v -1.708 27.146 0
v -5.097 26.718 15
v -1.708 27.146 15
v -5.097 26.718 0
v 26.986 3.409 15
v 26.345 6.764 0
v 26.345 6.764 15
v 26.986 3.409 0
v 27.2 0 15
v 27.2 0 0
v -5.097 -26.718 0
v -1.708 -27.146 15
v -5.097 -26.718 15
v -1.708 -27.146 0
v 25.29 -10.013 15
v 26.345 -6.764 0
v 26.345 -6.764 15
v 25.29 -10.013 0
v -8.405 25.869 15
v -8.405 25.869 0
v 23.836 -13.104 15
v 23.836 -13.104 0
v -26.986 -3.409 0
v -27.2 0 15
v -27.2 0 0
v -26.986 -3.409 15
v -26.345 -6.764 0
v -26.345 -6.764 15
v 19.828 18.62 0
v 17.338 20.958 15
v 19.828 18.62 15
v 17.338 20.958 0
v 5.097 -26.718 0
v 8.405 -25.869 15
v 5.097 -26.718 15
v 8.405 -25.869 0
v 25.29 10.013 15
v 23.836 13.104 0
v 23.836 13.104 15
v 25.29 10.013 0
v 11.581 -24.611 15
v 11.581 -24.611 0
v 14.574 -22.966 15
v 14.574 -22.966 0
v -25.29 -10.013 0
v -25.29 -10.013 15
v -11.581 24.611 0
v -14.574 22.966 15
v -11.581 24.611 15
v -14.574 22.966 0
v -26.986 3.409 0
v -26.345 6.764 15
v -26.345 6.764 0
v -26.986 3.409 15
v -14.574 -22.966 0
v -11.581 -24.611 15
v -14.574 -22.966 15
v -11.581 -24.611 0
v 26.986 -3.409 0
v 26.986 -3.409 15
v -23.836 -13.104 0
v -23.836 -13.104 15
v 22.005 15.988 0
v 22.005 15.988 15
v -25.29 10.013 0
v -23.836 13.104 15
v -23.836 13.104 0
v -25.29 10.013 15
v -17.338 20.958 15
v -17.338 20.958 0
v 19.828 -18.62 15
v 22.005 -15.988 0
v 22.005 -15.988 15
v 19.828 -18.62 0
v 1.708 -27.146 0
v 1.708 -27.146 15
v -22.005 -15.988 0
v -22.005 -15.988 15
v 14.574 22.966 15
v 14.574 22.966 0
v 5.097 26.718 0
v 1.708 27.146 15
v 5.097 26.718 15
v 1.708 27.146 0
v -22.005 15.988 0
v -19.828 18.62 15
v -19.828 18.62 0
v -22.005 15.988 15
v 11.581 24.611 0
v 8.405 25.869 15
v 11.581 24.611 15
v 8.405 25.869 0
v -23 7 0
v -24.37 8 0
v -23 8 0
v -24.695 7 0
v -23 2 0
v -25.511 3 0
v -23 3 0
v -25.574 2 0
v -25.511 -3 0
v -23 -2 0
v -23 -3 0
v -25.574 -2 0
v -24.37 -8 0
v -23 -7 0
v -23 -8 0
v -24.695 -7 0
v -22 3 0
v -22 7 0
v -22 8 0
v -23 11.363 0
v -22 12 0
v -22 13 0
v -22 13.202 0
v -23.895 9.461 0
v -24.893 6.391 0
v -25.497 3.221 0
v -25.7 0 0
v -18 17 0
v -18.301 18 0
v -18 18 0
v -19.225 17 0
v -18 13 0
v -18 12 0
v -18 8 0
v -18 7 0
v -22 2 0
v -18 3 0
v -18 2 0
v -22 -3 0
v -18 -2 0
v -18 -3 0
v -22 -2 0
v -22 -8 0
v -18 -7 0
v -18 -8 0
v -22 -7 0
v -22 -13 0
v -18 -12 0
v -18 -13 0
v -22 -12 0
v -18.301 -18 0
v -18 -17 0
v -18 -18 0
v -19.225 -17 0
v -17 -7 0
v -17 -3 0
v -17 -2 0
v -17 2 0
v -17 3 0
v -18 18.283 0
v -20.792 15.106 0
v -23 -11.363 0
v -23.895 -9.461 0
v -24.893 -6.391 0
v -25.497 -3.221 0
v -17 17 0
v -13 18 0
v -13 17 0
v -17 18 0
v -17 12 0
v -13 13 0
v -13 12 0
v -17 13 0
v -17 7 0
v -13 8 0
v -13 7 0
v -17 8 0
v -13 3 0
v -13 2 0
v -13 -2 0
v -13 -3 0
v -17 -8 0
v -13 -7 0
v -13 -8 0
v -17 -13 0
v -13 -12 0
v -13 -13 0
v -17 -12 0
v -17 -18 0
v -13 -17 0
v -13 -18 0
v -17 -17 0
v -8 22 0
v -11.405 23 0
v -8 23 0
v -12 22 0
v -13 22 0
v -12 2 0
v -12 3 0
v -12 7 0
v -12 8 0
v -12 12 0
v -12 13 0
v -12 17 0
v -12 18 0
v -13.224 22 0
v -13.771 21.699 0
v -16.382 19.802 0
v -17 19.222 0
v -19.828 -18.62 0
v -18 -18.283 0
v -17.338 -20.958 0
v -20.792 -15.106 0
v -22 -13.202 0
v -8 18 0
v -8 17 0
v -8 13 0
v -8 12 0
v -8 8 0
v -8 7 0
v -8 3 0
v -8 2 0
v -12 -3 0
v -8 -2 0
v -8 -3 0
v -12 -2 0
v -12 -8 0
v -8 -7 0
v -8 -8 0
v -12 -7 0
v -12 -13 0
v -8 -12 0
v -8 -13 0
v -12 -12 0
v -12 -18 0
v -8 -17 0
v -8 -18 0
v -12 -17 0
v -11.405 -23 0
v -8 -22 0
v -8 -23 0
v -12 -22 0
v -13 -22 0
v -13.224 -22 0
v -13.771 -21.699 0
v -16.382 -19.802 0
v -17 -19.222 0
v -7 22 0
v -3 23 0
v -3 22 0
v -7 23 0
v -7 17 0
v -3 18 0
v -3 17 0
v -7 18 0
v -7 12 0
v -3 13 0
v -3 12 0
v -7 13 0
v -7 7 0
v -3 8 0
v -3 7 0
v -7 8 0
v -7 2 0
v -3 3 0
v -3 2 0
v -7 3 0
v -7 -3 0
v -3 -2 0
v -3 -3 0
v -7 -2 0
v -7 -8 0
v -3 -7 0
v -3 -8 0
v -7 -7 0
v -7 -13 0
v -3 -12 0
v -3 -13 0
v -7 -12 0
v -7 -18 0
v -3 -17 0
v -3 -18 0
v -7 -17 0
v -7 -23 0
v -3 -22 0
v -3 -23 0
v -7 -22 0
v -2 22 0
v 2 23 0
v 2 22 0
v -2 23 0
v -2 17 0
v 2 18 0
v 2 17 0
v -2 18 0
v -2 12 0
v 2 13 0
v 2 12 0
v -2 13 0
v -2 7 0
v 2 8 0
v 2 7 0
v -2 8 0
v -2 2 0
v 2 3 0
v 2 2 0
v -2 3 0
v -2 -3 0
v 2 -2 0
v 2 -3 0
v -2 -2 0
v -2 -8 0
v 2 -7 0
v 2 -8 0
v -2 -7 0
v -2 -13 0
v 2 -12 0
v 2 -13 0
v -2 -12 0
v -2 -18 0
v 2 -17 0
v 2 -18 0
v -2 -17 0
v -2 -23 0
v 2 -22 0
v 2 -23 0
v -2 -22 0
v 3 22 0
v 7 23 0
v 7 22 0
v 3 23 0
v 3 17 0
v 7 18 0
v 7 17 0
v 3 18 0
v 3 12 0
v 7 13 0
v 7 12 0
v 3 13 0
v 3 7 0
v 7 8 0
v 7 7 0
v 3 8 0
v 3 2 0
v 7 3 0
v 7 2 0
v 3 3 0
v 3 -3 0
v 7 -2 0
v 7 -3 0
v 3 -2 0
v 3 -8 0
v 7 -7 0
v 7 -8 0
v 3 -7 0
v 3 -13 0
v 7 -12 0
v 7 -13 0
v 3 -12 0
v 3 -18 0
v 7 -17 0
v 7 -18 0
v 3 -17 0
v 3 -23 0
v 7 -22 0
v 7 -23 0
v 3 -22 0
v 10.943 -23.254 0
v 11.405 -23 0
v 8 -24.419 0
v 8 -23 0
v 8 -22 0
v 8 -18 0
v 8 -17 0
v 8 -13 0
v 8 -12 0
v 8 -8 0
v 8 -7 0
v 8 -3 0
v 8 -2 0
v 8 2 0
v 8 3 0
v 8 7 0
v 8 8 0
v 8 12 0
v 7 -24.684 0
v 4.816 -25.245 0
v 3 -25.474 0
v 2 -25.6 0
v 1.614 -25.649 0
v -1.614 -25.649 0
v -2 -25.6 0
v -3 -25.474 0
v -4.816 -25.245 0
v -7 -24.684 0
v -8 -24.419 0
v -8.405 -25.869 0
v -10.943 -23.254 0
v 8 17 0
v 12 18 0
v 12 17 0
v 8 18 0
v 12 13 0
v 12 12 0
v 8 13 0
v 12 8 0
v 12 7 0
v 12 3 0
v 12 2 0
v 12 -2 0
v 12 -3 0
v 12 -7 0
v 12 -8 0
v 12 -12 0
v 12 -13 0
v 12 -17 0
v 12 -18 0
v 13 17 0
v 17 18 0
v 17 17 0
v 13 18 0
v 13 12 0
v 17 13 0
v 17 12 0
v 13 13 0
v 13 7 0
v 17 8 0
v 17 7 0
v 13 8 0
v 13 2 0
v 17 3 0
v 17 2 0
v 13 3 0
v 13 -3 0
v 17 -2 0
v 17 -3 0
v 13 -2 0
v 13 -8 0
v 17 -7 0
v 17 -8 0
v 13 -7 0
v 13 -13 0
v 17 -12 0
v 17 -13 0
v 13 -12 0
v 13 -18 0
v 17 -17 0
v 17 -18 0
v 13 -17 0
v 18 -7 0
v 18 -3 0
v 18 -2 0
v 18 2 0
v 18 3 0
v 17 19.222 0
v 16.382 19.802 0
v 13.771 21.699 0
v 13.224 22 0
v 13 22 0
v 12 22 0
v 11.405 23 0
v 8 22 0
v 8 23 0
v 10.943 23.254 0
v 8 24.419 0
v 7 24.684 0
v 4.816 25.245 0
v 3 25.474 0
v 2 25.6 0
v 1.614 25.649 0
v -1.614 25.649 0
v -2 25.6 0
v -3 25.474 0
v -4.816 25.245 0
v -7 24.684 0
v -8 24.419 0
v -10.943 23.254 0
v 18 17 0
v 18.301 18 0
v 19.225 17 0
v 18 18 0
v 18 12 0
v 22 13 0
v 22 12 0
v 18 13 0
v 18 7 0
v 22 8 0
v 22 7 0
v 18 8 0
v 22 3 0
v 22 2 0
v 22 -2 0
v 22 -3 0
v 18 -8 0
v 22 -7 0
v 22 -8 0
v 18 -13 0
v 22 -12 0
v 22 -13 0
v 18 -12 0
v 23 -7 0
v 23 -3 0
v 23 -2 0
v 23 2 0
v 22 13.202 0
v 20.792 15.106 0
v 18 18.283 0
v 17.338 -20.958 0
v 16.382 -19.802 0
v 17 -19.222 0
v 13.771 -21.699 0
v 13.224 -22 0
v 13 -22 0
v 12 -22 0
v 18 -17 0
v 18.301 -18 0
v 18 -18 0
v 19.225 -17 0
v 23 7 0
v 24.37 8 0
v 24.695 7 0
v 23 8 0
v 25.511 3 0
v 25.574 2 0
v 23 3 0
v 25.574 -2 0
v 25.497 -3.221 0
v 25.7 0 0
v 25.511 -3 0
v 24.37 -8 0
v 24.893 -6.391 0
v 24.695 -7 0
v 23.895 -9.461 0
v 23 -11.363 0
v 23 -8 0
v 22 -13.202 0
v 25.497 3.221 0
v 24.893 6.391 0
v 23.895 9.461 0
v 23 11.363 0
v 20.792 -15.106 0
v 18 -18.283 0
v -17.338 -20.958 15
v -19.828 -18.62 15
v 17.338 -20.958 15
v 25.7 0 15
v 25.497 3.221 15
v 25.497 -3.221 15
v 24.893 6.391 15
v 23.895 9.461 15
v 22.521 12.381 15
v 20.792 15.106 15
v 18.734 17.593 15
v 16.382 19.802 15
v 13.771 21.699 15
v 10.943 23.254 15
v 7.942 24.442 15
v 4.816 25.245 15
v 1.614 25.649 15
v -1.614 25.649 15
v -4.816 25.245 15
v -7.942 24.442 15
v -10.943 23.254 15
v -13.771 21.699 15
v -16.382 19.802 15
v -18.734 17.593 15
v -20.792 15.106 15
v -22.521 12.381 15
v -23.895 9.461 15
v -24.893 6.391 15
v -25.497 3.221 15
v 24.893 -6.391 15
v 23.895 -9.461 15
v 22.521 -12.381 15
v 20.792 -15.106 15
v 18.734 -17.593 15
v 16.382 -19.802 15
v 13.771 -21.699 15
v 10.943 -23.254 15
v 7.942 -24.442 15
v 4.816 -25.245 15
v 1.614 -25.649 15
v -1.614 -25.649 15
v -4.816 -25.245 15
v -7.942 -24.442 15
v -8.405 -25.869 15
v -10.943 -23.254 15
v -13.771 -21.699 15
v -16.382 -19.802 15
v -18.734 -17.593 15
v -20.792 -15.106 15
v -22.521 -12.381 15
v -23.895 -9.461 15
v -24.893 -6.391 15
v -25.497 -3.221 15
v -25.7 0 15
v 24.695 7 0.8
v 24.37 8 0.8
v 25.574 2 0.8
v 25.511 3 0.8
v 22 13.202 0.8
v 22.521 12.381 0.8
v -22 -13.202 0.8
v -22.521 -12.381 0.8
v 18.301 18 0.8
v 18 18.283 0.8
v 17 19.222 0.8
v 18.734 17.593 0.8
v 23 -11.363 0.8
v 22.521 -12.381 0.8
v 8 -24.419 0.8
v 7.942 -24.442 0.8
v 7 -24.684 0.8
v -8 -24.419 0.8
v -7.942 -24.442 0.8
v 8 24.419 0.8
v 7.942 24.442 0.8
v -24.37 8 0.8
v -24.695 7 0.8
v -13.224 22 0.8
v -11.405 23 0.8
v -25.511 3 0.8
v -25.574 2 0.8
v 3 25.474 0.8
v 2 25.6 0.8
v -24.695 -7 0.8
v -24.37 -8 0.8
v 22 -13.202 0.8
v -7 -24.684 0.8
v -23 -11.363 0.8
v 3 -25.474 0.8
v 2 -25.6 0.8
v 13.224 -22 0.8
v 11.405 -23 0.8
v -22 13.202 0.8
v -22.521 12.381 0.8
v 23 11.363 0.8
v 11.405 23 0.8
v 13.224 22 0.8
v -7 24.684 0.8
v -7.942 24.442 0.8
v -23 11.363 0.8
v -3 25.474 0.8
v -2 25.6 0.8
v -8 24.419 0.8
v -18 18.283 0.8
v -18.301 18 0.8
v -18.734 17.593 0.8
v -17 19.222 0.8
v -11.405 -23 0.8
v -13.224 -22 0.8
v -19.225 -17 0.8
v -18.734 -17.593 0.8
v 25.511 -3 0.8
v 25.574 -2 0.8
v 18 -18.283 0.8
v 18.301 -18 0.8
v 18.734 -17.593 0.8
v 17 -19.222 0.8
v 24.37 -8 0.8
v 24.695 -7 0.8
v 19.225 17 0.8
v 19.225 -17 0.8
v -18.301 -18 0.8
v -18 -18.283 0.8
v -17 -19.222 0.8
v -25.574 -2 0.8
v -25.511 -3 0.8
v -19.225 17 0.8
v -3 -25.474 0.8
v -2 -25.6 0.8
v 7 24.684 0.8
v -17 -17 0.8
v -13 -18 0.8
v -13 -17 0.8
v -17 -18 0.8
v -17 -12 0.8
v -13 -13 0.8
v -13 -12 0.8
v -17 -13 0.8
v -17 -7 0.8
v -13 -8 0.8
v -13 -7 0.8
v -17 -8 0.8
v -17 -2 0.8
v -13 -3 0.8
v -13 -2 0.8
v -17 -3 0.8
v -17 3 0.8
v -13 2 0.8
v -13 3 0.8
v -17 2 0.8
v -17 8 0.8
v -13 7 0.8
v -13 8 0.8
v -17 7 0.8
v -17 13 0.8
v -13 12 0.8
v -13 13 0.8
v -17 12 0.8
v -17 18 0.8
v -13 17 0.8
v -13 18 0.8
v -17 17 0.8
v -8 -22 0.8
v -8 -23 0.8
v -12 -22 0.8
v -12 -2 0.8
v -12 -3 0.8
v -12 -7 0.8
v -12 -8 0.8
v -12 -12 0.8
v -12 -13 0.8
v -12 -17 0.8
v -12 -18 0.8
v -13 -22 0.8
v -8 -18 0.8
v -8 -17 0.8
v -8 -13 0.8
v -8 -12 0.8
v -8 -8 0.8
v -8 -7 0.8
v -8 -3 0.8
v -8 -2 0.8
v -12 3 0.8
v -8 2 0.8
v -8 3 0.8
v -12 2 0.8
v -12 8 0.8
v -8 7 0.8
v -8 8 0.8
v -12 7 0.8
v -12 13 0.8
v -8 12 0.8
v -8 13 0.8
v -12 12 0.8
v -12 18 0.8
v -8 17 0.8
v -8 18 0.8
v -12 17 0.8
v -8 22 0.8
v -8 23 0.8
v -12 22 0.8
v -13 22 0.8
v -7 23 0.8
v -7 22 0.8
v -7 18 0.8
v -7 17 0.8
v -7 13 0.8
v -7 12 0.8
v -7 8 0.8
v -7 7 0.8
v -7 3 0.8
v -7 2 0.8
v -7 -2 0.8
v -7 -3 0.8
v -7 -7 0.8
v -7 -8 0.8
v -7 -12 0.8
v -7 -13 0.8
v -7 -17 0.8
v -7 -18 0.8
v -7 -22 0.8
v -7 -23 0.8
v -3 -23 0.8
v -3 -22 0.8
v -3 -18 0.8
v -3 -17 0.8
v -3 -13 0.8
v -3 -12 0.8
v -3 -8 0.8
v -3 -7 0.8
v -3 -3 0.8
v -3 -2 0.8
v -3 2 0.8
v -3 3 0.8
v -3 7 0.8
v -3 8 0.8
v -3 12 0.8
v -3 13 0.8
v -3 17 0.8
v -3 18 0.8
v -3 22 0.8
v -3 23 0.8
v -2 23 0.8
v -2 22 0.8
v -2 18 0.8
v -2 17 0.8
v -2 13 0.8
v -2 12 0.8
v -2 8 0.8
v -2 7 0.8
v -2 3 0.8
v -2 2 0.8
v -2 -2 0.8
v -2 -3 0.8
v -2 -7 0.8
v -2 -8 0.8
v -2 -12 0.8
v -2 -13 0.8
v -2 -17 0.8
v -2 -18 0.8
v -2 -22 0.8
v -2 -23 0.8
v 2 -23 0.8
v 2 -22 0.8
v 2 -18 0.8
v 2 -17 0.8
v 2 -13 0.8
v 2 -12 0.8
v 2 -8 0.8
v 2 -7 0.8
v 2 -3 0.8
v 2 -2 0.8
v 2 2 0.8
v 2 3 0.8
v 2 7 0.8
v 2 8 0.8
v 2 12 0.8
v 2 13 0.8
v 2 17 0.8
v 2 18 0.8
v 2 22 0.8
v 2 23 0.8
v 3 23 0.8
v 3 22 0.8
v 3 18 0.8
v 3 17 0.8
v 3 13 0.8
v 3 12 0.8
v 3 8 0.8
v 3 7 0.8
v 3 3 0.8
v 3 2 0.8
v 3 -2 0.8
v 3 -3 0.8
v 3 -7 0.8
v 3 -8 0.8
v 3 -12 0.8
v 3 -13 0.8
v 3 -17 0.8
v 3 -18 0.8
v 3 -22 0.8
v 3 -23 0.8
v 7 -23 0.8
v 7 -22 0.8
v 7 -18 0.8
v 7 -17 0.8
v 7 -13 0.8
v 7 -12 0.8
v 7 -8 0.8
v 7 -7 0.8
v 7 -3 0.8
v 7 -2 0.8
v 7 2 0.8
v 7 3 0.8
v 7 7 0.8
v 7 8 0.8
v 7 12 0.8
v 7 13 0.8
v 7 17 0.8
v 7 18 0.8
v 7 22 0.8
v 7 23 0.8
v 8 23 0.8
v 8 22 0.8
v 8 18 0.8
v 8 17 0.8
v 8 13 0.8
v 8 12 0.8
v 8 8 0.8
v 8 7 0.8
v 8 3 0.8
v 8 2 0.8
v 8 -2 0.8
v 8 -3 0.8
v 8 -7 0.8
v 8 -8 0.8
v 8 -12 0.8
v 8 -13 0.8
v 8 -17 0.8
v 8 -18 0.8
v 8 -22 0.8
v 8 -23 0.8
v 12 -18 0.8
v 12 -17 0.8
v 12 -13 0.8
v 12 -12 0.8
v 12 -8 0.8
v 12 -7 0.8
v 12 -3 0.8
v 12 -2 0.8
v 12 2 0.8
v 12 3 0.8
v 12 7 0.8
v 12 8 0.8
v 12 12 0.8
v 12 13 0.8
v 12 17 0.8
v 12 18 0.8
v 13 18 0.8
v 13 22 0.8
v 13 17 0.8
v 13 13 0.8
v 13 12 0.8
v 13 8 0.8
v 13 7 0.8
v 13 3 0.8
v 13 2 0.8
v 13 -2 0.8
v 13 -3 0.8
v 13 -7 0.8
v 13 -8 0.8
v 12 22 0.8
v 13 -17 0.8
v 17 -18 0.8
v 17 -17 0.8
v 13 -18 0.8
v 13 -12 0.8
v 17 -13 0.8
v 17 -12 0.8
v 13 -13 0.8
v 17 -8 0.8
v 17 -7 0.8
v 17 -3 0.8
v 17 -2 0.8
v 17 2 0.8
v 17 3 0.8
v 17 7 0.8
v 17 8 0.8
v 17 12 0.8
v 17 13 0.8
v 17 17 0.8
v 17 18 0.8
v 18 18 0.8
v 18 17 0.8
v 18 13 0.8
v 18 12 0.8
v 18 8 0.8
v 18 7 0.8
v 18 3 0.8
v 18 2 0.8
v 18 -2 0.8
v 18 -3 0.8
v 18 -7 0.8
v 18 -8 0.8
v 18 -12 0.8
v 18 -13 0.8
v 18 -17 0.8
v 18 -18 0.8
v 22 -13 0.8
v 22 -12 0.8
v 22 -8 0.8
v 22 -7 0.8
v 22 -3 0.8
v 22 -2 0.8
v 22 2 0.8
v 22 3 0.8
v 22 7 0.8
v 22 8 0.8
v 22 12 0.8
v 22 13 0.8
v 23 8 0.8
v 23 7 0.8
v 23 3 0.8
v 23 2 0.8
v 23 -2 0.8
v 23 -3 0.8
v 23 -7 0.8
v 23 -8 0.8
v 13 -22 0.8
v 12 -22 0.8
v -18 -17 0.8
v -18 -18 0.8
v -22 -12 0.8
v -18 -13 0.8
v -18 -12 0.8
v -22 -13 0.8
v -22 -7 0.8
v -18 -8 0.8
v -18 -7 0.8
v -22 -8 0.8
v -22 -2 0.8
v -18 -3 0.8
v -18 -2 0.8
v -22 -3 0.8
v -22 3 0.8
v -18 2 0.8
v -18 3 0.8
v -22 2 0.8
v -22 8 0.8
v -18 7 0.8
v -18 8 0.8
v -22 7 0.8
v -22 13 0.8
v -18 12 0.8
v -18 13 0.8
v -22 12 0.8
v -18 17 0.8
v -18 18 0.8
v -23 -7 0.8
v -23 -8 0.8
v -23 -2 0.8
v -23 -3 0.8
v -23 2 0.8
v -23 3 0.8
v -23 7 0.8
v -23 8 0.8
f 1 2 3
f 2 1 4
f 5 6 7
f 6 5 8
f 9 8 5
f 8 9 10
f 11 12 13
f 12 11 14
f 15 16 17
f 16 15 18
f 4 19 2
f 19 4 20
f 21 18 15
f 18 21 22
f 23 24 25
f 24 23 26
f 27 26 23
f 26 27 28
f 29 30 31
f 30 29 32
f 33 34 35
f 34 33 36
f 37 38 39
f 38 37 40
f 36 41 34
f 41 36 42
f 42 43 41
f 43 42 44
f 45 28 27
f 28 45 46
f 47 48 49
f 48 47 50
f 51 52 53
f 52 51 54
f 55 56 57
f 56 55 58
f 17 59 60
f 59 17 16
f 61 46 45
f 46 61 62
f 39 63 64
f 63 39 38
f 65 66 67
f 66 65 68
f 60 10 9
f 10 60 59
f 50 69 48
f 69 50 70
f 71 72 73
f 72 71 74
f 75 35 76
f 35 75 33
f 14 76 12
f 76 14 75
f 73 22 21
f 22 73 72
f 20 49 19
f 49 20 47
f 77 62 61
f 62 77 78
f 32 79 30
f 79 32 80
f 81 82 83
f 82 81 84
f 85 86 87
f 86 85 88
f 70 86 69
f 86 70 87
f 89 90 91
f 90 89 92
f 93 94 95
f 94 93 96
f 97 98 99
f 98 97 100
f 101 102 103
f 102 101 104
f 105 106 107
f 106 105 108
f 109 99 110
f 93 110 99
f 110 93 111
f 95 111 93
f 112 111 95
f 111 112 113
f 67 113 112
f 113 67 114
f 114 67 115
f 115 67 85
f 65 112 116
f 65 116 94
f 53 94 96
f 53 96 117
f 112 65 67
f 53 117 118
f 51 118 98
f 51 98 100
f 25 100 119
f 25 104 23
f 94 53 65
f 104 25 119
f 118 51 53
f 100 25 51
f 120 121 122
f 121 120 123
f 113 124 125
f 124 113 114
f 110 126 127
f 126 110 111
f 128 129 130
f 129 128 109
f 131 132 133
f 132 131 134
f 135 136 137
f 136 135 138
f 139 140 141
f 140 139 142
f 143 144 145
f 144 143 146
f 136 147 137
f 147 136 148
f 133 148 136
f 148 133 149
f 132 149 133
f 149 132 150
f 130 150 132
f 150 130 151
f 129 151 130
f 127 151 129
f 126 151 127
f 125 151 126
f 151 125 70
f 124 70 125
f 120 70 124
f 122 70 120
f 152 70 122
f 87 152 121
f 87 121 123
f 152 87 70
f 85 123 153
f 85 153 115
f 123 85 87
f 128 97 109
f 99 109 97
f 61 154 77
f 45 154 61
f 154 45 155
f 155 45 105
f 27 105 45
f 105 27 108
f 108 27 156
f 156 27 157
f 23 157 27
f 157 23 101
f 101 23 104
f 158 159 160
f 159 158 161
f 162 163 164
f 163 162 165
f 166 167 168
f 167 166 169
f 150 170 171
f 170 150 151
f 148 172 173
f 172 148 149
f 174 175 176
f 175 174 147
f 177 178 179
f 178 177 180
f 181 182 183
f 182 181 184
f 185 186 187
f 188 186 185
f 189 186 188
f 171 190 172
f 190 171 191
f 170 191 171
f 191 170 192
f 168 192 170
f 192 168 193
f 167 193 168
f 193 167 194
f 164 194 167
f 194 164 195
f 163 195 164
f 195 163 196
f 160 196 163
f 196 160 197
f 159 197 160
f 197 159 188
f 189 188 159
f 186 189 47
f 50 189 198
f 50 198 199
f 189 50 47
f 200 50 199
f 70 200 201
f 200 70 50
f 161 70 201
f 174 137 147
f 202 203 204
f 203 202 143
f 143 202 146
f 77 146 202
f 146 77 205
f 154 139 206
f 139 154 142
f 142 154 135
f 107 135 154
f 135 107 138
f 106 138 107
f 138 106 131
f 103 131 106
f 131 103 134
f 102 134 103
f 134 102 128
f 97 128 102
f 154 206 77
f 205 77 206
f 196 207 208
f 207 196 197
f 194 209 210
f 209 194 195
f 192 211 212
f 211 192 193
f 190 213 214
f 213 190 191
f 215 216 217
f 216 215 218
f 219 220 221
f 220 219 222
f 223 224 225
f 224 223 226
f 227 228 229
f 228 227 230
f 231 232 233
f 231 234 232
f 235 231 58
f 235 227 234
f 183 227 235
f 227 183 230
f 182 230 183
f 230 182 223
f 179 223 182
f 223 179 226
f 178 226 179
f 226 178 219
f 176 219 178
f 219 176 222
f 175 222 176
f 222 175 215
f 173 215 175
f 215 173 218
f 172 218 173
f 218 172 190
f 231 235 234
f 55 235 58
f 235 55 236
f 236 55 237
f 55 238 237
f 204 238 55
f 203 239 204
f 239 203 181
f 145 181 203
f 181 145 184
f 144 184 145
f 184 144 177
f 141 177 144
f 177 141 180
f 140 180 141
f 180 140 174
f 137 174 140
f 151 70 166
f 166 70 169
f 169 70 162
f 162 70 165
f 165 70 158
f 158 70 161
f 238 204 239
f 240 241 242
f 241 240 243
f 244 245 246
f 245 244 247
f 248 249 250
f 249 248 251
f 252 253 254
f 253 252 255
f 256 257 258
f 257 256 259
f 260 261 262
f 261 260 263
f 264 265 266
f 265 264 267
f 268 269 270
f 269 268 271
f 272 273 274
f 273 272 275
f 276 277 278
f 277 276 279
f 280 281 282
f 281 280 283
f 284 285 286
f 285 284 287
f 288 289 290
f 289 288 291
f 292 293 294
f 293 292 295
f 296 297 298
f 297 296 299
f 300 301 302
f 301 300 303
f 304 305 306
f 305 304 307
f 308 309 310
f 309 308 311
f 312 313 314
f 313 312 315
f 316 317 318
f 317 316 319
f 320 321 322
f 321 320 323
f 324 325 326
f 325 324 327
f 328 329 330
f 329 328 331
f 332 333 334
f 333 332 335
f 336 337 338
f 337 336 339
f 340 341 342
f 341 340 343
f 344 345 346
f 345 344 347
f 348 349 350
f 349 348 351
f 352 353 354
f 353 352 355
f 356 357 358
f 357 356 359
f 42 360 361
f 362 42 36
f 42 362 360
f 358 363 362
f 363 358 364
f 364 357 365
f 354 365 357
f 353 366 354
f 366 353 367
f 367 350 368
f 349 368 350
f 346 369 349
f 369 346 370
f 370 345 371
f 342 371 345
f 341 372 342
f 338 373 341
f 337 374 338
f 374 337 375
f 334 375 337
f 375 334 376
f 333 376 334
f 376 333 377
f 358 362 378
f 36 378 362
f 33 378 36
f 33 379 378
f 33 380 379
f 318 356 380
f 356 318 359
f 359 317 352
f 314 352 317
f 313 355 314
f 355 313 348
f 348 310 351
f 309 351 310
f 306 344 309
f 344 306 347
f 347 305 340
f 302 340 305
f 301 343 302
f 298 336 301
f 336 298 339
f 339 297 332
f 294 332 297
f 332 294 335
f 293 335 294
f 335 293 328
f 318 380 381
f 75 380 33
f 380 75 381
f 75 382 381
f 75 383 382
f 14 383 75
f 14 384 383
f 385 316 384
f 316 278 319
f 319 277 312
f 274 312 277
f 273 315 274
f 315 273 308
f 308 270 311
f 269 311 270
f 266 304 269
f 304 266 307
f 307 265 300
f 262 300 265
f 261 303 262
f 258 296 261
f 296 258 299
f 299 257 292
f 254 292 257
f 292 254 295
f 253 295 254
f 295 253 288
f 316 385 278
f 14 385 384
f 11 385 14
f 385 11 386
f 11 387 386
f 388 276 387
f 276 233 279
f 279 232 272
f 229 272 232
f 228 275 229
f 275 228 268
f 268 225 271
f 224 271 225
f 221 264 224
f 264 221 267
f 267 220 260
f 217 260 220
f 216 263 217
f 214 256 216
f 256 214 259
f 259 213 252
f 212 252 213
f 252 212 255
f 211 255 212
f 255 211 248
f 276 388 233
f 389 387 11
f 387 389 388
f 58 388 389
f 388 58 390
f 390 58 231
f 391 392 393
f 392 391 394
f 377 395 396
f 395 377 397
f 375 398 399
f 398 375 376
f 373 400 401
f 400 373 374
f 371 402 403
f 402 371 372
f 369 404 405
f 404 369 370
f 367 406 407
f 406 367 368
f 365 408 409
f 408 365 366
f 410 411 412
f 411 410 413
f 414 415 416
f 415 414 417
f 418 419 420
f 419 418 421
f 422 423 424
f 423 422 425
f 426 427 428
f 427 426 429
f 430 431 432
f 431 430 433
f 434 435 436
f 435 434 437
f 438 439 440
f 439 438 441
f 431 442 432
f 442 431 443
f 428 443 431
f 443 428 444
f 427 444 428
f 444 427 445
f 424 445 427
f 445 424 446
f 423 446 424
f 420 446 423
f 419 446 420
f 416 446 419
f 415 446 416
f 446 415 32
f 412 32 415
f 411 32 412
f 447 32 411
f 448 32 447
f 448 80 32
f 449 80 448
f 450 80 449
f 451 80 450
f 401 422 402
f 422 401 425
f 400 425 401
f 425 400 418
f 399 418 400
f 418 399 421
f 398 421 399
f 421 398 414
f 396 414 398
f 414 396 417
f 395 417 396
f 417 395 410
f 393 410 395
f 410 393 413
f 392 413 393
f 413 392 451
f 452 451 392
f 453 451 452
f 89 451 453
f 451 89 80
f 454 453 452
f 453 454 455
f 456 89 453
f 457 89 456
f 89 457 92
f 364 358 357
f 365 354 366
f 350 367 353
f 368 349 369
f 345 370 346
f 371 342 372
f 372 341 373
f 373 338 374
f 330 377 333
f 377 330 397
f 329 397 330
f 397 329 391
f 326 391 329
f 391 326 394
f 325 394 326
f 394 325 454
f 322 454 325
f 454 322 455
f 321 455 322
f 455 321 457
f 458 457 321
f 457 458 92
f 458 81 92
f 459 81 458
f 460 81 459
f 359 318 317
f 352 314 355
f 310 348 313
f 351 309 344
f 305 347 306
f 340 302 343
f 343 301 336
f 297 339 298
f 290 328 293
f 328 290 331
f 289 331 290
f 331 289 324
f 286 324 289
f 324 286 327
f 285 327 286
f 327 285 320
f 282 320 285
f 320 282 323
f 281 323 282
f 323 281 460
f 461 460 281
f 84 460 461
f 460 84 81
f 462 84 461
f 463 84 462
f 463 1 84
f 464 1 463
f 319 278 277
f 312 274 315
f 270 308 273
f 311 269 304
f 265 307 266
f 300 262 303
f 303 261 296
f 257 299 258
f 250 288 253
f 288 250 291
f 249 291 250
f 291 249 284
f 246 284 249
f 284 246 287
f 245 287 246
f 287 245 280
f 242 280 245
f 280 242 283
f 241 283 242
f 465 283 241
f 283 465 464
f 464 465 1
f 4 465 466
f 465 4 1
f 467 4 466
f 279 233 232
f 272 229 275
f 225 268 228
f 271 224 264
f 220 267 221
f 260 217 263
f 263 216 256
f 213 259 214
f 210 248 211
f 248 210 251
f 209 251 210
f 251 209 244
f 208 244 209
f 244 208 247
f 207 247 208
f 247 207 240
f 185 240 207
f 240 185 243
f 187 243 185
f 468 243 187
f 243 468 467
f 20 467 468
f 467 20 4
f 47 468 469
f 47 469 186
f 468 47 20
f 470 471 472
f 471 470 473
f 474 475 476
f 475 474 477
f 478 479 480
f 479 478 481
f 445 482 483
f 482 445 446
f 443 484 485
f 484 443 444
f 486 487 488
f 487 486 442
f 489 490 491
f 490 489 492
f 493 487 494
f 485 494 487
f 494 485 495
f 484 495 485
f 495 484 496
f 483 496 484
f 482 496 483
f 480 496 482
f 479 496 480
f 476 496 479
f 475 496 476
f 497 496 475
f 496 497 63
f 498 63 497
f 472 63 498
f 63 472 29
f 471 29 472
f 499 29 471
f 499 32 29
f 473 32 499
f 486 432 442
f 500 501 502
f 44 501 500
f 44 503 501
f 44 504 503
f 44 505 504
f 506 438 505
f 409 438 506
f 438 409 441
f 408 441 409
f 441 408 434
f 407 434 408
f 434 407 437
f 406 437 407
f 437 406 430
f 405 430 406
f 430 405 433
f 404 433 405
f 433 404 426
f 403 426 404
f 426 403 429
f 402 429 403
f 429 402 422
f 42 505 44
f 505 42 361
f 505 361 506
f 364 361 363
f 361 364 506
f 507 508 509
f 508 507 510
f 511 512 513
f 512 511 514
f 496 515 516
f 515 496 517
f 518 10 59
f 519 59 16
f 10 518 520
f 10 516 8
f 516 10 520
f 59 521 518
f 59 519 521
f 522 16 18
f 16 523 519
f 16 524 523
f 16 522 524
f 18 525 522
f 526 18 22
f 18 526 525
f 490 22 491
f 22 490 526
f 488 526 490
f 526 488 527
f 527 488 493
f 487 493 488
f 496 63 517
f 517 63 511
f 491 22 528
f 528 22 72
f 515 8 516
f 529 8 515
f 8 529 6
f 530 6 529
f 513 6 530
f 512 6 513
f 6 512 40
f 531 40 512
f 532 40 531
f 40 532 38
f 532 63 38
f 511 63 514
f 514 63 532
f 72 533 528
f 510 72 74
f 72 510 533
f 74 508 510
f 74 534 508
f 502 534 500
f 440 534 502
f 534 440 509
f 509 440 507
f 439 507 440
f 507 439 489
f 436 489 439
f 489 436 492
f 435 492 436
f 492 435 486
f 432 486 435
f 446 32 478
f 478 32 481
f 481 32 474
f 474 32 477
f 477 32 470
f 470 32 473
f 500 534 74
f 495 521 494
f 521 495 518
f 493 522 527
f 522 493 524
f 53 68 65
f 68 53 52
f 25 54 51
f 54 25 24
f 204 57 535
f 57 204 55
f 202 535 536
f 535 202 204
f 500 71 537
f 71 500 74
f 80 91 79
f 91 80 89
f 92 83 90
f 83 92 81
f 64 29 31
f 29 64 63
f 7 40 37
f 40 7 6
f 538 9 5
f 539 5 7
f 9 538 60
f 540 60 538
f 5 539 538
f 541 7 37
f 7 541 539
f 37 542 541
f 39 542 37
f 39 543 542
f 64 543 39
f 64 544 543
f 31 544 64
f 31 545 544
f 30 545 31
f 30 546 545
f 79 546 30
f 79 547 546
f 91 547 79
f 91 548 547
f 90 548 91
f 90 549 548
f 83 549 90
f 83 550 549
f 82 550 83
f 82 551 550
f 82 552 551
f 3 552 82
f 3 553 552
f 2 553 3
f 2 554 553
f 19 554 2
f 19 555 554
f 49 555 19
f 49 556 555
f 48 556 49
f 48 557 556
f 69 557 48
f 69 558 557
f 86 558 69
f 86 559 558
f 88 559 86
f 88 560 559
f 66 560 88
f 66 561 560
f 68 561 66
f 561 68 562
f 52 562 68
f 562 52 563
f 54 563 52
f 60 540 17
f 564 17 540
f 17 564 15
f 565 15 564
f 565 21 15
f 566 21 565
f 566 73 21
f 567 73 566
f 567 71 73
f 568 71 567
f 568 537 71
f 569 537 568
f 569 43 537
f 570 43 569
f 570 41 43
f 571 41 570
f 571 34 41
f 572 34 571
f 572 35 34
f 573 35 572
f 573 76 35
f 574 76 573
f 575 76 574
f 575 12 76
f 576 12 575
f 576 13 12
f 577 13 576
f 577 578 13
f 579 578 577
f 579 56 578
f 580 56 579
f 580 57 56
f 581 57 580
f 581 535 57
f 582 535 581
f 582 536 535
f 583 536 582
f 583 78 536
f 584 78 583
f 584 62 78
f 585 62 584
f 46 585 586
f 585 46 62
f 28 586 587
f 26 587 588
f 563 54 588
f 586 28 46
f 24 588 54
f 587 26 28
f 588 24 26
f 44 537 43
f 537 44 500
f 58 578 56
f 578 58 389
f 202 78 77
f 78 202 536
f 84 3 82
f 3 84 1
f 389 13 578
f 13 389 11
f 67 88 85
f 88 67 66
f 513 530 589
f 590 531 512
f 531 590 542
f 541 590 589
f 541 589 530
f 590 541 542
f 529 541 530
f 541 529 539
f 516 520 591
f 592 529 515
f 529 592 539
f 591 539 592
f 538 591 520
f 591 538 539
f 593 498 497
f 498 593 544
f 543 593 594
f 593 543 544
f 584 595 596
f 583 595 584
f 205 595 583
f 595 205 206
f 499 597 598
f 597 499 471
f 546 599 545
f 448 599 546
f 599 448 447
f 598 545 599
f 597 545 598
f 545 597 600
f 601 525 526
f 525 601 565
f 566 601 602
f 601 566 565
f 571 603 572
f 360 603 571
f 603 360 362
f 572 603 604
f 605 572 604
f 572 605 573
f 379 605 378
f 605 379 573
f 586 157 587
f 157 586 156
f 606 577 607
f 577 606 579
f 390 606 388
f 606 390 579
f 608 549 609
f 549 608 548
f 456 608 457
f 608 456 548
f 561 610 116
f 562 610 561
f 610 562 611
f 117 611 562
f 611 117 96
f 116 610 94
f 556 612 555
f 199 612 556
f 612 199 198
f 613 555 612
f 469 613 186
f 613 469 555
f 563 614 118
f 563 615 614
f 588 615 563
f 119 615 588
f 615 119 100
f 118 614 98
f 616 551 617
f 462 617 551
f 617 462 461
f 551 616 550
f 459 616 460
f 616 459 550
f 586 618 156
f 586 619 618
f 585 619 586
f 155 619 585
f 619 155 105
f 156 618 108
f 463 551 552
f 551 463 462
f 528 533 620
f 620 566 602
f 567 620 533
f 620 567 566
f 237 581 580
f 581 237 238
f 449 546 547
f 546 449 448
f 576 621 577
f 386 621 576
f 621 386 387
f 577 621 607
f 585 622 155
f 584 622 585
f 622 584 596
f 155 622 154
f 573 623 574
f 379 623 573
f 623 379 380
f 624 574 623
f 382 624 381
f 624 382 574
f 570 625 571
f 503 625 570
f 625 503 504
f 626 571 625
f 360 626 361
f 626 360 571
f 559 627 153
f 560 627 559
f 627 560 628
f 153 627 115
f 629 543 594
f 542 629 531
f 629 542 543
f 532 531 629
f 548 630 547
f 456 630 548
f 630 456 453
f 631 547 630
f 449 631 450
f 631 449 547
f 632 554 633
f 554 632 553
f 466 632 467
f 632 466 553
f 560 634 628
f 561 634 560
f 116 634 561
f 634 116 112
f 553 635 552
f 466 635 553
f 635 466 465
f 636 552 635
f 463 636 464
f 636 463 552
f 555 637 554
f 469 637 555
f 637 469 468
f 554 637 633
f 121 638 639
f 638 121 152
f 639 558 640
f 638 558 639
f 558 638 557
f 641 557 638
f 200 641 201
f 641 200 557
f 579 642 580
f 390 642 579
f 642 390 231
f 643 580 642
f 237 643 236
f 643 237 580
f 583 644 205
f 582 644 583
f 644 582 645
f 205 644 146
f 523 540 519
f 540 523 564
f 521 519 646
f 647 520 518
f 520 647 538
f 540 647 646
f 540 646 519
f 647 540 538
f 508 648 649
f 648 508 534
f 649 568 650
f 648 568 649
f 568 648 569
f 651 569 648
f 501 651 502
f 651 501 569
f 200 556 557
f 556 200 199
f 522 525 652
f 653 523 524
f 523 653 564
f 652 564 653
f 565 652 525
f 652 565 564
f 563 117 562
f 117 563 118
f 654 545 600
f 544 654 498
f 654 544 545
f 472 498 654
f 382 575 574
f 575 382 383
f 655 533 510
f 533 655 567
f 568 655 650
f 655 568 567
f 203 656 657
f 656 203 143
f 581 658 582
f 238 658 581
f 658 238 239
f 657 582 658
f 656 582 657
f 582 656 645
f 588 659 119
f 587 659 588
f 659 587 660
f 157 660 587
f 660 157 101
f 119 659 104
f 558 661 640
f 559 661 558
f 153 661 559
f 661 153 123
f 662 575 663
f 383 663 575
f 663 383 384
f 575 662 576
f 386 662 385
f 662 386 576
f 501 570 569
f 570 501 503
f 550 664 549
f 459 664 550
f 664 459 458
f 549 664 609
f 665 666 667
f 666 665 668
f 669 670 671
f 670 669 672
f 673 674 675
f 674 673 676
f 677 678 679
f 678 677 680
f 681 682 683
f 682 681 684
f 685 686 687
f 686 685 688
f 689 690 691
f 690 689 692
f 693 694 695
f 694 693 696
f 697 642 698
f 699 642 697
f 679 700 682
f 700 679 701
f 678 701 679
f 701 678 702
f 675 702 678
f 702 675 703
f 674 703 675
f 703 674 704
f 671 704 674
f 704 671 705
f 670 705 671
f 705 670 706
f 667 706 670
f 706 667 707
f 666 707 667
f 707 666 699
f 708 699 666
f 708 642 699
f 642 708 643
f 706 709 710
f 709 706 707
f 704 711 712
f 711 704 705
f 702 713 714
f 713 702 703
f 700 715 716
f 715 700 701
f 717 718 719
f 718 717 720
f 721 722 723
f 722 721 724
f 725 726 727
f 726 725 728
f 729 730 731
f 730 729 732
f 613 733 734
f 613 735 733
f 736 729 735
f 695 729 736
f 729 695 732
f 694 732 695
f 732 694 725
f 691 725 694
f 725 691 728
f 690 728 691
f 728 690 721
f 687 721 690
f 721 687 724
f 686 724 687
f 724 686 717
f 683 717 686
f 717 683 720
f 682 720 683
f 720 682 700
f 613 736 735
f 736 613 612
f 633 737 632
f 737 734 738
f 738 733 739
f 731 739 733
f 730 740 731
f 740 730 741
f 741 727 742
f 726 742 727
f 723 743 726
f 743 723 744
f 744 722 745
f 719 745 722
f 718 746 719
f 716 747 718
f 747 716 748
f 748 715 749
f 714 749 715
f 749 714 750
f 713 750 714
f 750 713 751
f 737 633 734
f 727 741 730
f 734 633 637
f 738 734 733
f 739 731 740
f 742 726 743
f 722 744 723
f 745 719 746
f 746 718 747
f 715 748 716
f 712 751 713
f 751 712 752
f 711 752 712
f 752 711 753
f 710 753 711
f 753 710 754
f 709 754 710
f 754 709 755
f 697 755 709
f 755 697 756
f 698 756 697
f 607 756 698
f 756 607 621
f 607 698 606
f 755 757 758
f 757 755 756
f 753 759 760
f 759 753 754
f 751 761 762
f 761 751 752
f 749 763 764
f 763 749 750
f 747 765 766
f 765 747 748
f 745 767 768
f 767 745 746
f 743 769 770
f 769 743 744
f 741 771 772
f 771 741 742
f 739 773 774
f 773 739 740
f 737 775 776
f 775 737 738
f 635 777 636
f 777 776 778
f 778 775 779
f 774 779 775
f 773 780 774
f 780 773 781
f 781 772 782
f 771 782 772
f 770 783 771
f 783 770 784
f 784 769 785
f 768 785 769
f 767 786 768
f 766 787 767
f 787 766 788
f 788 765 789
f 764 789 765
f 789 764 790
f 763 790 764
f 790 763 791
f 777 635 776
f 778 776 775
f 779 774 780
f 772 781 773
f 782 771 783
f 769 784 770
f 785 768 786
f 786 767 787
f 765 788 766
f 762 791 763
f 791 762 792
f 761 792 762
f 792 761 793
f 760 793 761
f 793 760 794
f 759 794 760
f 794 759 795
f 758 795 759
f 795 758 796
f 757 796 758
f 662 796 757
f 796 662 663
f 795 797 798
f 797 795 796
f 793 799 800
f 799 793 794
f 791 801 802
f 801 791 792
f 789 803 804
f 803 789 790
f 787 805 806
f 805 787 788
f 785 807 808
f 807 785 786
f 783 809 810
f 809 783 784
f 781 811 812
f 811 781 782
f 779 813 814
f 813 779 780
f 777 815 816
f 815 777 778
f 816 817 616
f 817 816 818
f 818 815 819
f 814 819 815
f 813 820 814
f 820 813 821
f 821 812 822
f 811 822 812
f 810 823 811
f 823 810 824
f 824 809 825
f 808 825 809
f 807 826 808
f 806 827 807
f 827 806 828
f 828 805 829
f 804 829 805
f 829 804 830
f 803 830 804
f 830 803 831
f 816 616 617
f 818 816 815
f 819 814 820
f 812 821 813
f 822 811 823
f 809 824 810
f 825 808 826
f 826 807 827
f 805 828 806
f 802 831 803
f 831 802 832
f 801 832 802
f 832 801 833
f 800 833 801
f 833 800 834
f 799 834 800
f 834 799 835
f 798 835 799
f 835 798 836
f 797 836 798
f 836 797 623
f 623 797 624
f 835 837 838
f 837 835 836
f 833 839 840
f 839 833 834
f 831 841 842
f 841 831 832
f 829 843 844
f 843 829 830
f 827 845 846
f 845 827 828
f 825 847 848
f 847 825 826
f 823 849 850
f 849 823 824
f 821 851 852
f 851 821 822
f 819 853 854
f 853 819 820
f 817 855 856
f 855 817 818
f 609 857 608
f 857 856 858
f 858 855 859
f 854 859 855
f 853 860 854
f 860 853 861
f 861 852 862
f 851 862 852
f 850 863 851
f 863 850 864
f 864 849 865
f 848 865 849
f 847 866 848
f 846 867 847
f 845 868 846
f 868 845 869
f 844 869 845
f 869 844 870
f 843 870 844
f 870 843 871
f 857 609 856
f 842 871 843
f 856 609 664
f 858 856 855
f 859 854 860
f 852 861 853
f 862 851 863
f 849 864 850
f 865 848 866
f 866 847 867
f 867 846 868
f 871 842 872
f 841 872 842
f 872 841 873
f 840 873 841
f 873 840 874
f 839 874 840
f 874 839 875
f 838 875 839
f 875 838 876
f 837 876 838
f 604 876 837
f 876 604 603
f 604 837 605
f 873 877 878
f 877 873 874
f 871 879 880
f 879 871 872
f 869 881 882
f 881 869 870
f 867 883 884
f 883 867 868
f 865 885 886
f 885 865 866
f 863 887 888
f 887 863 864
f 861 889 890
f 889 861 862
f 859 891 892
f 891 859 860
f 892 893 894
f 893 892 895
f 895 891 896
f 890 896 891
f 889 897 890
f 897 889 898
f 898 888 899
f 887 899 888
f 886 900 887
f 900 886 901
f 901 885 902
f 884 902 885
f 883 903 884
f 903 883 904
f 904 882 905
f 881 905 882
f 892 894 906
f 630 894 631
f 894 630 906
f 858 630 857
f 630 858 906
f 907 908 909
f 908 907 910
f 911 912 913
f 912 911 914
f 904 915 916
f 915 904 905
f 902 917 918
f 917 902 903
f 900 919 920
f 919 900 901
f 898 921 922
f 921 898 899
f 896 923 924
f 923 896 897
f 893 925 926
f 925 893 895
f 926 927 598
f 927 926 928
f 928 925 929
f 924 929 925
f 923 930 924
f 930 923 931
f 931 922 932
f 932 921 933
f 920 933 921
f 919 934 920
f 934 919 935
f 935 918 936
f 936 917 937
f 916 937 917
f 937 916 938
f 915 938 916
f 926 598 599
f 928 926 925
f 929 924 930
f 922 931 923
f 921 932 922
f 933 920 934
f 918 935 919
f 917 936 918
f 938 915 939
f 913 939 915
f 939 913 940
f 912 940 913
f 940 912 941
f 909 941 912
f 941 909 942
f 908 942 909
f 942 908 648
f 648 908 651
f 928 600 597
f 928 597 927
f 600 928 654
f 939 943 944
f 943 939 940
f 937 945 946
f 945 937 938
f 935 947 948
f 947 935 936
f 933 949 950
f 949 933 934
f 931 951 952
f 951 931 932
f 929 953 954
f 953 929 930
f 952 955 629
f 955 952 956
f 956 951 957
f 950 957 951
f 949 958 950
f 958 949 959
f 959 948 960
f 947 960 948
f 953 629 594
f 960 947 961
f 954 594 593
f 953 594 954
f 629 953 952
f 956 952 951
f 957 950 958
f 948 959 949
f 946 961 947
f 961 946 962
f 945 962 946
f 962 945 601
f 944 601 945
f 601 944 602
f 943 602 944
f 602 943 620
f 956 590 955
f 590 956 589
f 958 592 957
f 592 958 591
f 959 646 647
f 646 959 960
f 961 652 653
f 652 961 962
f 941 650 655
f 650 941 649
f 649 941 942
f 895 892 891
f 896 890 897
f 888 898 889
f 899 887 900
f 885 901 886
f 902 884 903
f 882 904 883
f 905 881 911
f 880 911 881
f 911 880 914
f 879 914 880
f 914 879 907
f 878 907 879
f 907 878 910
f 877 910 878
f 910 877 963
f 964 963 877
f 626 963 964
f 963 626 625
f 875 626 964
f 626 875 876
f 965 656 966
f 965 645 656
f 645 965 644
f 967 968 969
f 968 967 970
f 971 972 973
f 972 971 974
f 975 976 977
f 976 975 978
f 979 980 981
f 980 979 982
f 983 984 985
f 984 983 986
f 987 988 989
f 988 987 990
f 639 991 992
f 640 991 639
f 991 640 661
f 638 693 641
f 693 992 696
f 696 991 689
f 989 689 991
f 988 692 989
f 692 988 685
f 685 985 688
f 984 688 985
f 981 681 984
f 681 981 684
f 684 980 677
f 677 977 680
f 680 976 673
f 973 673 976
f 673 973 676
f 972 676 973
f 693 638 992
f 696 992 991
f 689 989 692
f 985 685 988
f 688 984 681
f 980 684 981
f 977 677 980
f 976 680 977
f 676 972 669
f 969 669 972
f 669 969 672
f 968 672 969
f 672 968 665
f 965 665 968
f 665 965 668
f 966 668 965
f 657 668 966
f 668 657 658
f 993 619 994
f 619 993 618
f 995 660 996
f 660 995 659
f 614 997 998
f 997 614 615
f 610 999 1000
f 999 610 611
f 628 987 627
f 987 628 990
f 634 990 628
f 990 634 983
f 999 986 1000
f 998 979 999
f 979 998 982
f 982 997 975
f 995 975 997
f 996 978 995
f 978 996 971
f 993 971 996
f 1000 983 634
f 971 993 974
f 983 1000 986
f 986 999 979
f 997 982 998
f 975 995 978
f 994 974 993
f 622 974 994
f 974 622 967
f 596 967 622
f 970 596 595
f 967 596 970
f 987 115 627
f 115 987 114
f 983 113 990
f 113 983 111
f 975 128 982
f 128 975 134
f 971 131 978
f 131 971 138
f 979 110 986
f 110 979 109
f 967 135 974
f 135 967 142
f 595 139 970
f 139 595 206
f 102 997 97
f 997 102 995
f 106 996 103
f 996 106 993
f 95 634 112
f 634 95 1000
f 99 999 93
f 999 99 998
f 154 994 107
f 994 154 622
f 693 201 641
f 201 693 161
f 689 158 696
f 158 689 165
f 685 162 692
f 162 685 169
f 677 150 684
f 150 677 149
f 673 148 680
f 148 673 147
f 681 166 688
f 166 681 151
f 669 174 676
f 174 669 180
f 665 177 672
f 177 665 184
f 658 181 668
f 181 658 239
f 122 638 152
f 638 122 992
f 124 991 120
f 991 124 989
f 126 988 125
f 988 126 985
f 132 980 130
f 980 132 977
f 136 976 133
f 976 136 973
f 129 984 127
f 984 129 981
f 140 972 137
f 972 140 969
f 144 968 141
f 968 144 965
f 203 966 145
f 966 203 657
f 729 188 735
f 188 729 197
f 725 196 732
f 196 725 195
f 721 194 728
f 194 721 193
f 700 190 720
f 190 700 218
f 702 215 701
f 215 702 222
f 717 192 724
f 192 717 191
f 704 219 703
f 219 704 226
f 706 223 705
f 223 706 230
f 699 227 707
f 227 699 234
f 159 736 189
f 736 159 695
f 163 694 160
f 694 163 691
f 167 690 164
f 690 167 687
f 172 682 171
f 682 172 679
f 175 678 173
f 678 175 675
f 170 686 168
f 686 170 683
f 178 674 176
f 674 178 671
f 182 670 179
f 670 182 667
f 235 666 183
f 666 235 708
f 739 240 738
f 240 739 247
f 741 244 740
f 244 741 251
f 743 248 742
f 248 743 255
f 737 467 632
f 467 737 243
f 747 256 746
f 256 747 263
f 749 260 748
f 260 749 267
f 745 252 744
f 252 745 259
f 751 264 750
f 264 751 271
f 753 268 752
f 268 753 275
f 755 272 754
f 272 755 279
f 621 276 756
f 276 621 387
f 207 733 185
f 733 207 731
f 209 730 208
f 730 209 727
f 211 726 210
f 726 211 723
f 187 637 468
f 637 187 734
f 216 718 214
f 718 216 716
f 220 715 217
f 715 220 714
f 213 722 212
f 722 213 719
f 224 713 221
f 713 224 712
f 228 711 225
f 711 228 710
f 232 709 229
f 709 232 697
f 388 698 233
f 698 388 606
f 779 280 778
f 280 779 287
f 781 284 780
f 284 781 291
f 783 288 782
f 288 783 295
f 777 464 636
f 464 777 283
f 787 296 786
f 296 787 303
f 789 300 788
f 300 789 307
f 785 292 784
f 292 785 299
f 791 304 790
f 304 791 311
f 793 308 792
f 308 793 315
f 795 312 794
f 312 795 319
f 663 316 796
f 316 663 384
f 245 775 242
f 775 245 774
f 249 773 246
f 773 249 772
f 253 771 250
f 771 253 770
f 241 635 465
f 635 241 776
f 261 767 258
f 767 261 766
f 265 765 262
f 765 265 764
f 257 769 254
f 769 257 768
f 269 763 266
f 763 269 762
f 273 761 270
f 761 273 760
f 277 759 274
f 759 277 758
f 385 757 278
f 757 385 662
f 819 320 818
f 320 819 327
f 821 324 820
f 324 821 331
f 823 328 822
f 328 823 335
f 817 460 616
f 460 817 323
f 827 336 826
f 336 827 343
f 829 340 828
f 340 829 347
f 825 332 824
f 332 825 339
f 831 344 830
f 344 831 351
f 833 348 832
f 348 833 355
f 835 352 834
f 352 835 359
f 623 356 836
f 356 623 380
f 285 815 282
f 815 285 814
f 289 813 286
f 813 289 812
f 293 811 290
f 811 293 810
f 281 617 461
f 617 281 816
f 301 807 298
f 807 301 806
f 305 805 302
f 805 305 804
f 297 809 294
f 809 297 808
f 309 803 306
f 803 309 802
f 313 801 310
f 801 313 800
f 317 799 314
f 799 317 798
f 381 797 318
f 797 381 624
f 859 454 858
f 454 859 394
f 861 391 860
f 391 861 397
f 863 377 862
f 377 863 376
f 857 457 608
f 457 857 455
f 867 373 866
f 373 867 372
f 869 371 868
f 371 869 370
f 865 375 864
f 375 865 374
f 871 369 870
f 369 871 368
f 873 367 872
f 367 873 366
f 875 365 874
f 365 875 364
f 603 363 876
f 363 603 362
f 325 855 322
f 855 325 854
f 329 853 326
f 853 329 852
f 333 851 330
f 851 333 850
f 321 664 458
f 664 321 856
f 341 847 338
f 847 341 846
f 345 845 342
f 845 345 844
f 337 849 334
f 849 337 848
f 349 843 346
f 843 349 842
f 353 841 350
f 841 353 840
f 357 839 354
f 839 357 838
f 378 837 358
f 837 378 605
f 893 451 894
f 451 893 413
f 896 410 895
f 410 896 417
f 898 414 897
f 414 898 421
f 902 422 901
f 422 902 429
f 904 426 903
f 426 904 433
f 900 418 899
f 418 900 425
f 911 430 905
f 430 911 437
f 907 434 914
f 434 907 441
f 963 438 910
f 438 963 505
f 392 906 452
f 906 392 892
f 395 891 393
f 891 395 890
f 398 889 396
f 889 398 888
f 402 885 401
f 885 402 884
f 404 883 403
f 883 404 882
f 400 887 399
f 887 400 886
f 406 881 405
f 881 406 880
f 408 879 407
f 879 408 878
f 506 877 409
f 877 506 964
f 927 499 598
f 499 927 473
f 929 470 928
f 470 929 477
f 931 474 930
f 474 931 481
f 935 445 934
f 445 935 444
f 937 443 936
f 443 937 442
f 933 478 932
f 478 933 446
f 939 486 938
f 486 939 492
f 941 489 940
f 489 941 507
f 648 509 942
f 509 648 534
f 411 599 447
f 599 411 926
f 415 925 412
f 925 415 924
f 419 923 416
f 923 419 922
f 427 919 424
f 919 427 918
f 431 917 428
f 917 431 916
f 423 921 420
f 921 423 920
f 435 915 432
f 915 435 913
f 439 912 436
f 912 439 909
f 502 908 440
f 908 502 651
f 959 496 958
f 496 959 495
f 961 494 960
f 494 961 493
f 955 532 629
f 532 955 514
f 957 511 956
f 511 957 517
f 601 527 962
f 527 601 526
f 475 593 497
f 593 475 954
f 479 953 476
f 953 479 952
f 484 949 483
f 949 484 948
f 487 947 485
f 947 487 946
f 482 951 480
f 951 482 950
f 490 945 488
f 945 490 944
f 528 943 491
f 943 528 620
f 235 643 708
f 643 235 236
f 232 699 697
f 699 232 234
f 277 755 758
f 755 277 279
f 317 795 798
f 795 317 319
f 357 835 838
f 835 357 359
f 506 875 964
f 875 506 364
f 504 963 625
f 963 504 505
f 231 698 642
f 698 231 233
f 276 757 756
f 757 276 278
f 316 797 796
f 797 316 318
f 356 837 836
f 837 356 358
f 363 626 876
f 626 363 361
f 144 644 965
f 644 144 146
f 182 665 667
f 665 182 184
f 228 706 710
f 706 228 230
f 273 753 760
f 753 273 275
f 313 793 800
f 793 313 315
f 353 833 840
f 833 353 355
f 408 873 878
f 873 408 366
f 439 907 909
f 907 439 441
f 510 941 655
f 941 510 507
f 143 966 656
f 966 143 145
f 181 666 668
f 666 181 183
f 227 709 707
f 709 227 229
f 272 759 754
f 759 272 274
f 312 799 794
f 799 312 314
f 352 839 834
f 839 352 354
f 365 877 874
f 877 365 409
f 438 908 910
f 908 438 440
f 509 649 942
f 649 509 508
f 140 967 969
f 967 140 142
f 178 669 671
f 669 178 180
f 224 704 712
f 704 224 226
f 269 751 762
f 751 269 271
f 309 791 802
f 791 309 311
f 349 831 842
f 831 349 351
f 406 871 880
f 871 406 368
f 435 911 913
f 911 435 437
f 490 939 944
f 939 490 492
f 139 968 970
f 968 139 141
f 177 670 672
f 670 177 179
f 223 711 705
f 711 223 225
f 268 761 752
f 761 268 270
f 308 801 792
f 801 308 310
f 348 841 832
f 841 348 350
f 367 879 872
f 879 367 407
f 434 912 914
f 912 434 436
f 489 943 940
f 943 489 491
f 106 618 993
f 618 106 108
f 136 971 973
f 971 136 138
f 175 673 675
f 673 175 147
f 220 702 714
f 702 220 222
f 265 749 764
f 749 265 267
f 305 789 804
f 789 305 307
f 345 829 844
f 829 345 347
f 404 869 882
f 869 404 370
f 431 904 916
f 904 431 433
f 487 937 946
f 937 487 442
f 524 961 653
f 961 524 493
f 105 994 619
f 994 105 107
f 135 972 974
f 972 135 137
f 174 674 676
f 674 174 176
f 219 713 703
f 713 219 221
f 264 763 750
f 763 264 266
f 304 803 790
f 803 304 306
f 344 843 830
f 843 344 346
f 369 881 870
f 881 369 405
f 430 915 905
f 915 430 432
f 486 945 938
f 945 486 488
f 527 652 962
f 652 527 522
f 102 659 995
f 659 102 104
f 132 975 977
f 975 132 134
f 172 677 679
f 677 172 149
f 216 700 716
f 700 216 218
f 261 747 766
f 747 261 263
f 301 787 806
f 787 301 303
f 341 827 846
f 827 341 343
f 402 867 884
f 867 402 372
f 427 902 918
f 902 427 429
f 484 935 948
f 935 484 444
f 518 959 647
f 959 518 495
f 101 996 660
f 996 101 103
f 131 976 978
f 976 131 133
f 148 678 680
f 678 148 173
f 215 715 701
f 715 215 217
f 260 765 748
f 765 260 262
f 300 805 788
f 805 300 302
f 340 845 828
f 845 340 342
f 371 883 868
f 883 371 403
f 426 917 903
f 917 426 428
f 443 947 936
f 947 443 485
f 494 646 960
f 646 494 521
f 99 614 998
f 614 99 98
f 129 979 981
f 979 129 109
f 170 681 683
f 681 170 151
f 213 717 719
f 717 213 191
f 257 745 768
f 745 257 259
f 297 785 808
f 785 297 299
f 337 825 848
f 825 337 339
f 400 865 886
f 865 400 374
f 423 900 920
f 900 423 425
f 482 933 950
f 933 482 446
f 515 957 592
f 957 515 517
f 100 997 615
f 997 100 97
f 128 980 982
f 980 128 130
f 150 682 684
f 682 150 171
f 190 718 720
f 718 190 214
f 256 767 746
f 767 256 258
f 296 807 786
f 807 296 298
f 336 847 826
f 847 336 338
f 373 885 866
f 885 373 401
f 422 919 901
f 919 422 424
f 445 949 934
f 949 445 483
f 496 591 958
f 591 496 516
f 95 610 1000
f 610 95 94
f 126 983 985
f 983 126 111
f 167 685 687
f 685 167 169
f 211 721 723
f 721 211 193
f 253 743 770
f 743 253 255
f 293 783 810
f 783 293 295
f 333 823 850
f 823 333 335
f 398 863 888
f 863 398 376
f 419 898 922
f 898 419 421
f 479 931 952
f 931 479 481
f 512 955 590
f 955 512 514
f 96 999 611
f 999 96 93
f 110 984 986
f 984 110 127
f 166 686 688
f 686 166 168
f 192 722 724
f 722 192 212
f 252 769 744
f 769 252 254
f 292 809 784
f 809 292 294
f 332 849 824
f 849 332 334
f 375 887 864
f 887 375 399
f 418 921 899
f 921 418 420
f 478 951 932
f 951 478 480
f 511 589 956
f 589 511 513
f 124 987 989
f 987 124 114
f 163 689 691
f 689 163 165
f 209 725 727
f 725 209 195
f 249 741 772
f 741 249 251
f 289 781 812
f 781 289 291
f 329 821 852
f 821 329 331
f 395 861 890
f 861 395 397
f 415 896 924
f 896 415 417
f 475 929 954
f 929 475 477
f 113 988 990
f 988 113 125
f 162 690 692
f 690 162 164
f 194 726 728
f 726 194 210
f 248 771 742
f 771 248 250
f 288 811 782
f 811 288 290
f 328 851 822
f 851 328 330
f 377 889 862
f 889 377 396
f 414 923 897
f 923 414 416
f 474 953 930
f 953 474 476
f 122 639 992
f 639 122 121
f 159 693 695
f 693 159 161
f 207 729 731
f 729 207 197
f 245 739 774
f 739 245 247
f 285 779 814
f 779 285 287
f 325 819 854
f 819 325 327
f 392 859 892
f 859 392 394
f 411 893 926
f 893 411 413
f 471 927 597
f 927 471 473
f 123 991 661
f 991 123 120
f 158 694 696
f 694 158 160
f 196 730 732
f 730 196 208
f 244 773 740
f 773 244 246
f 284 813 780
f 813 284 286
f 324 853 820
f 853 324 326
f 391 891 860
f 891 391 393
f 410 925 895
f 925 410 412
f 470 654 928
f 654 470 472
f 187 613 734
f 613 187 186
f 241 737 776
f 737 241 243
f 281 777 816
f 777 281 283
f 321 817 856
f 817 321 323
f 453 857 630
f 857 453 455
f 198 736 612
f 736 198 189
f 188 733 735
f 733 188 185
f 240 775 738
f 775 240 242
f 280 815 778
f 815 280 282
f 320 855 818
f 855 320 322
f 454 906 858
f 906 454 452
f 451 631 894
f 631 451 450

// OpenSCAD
python_od = 51.4; 
grid_spacing = 5; 
grid_w = 1.0;
python_ht = 15; 
grid_ht = 0.8; 
outer_wall_w = 1.5;
eps = 0.01; 

$fn=50; 

module mesh(x, y, spacing, ht, th){ 
  total_x = x*spacing; 
  total_y = y*spacing; 
  for (xdir = [-total_x/2:spacing:total_x/2]) {
     translate([-th/2+xdir,-total_y/2,0]) 
        cube([th,total_y,ht]);  
  }
  for (ydir = [-total_y/2:spacing:total_y/2]) {
    translate([-total_x/2,-th/2+ydir,0]) 
        cube([total_x,th,ht]); 
  }
}

num_mesh = round(python_od/grid_spacing+1);
echo(num_mesh);

module cover() {
  difference() {
    cylinder(h=python_ht, d=python_od+2*outer_wall_w); 
    translate([0,0,-eps]) cylinder(h=python_ht+2*eps, d=python_od); 
  }
  intersection(){
    cylinder(h=python_ht, d=python_od+2*outer_wall_w);
    mesh(num_mesh, num_mesh,grid_spacing,grid_ht,grid_w);  
  }
}

cover(); 
